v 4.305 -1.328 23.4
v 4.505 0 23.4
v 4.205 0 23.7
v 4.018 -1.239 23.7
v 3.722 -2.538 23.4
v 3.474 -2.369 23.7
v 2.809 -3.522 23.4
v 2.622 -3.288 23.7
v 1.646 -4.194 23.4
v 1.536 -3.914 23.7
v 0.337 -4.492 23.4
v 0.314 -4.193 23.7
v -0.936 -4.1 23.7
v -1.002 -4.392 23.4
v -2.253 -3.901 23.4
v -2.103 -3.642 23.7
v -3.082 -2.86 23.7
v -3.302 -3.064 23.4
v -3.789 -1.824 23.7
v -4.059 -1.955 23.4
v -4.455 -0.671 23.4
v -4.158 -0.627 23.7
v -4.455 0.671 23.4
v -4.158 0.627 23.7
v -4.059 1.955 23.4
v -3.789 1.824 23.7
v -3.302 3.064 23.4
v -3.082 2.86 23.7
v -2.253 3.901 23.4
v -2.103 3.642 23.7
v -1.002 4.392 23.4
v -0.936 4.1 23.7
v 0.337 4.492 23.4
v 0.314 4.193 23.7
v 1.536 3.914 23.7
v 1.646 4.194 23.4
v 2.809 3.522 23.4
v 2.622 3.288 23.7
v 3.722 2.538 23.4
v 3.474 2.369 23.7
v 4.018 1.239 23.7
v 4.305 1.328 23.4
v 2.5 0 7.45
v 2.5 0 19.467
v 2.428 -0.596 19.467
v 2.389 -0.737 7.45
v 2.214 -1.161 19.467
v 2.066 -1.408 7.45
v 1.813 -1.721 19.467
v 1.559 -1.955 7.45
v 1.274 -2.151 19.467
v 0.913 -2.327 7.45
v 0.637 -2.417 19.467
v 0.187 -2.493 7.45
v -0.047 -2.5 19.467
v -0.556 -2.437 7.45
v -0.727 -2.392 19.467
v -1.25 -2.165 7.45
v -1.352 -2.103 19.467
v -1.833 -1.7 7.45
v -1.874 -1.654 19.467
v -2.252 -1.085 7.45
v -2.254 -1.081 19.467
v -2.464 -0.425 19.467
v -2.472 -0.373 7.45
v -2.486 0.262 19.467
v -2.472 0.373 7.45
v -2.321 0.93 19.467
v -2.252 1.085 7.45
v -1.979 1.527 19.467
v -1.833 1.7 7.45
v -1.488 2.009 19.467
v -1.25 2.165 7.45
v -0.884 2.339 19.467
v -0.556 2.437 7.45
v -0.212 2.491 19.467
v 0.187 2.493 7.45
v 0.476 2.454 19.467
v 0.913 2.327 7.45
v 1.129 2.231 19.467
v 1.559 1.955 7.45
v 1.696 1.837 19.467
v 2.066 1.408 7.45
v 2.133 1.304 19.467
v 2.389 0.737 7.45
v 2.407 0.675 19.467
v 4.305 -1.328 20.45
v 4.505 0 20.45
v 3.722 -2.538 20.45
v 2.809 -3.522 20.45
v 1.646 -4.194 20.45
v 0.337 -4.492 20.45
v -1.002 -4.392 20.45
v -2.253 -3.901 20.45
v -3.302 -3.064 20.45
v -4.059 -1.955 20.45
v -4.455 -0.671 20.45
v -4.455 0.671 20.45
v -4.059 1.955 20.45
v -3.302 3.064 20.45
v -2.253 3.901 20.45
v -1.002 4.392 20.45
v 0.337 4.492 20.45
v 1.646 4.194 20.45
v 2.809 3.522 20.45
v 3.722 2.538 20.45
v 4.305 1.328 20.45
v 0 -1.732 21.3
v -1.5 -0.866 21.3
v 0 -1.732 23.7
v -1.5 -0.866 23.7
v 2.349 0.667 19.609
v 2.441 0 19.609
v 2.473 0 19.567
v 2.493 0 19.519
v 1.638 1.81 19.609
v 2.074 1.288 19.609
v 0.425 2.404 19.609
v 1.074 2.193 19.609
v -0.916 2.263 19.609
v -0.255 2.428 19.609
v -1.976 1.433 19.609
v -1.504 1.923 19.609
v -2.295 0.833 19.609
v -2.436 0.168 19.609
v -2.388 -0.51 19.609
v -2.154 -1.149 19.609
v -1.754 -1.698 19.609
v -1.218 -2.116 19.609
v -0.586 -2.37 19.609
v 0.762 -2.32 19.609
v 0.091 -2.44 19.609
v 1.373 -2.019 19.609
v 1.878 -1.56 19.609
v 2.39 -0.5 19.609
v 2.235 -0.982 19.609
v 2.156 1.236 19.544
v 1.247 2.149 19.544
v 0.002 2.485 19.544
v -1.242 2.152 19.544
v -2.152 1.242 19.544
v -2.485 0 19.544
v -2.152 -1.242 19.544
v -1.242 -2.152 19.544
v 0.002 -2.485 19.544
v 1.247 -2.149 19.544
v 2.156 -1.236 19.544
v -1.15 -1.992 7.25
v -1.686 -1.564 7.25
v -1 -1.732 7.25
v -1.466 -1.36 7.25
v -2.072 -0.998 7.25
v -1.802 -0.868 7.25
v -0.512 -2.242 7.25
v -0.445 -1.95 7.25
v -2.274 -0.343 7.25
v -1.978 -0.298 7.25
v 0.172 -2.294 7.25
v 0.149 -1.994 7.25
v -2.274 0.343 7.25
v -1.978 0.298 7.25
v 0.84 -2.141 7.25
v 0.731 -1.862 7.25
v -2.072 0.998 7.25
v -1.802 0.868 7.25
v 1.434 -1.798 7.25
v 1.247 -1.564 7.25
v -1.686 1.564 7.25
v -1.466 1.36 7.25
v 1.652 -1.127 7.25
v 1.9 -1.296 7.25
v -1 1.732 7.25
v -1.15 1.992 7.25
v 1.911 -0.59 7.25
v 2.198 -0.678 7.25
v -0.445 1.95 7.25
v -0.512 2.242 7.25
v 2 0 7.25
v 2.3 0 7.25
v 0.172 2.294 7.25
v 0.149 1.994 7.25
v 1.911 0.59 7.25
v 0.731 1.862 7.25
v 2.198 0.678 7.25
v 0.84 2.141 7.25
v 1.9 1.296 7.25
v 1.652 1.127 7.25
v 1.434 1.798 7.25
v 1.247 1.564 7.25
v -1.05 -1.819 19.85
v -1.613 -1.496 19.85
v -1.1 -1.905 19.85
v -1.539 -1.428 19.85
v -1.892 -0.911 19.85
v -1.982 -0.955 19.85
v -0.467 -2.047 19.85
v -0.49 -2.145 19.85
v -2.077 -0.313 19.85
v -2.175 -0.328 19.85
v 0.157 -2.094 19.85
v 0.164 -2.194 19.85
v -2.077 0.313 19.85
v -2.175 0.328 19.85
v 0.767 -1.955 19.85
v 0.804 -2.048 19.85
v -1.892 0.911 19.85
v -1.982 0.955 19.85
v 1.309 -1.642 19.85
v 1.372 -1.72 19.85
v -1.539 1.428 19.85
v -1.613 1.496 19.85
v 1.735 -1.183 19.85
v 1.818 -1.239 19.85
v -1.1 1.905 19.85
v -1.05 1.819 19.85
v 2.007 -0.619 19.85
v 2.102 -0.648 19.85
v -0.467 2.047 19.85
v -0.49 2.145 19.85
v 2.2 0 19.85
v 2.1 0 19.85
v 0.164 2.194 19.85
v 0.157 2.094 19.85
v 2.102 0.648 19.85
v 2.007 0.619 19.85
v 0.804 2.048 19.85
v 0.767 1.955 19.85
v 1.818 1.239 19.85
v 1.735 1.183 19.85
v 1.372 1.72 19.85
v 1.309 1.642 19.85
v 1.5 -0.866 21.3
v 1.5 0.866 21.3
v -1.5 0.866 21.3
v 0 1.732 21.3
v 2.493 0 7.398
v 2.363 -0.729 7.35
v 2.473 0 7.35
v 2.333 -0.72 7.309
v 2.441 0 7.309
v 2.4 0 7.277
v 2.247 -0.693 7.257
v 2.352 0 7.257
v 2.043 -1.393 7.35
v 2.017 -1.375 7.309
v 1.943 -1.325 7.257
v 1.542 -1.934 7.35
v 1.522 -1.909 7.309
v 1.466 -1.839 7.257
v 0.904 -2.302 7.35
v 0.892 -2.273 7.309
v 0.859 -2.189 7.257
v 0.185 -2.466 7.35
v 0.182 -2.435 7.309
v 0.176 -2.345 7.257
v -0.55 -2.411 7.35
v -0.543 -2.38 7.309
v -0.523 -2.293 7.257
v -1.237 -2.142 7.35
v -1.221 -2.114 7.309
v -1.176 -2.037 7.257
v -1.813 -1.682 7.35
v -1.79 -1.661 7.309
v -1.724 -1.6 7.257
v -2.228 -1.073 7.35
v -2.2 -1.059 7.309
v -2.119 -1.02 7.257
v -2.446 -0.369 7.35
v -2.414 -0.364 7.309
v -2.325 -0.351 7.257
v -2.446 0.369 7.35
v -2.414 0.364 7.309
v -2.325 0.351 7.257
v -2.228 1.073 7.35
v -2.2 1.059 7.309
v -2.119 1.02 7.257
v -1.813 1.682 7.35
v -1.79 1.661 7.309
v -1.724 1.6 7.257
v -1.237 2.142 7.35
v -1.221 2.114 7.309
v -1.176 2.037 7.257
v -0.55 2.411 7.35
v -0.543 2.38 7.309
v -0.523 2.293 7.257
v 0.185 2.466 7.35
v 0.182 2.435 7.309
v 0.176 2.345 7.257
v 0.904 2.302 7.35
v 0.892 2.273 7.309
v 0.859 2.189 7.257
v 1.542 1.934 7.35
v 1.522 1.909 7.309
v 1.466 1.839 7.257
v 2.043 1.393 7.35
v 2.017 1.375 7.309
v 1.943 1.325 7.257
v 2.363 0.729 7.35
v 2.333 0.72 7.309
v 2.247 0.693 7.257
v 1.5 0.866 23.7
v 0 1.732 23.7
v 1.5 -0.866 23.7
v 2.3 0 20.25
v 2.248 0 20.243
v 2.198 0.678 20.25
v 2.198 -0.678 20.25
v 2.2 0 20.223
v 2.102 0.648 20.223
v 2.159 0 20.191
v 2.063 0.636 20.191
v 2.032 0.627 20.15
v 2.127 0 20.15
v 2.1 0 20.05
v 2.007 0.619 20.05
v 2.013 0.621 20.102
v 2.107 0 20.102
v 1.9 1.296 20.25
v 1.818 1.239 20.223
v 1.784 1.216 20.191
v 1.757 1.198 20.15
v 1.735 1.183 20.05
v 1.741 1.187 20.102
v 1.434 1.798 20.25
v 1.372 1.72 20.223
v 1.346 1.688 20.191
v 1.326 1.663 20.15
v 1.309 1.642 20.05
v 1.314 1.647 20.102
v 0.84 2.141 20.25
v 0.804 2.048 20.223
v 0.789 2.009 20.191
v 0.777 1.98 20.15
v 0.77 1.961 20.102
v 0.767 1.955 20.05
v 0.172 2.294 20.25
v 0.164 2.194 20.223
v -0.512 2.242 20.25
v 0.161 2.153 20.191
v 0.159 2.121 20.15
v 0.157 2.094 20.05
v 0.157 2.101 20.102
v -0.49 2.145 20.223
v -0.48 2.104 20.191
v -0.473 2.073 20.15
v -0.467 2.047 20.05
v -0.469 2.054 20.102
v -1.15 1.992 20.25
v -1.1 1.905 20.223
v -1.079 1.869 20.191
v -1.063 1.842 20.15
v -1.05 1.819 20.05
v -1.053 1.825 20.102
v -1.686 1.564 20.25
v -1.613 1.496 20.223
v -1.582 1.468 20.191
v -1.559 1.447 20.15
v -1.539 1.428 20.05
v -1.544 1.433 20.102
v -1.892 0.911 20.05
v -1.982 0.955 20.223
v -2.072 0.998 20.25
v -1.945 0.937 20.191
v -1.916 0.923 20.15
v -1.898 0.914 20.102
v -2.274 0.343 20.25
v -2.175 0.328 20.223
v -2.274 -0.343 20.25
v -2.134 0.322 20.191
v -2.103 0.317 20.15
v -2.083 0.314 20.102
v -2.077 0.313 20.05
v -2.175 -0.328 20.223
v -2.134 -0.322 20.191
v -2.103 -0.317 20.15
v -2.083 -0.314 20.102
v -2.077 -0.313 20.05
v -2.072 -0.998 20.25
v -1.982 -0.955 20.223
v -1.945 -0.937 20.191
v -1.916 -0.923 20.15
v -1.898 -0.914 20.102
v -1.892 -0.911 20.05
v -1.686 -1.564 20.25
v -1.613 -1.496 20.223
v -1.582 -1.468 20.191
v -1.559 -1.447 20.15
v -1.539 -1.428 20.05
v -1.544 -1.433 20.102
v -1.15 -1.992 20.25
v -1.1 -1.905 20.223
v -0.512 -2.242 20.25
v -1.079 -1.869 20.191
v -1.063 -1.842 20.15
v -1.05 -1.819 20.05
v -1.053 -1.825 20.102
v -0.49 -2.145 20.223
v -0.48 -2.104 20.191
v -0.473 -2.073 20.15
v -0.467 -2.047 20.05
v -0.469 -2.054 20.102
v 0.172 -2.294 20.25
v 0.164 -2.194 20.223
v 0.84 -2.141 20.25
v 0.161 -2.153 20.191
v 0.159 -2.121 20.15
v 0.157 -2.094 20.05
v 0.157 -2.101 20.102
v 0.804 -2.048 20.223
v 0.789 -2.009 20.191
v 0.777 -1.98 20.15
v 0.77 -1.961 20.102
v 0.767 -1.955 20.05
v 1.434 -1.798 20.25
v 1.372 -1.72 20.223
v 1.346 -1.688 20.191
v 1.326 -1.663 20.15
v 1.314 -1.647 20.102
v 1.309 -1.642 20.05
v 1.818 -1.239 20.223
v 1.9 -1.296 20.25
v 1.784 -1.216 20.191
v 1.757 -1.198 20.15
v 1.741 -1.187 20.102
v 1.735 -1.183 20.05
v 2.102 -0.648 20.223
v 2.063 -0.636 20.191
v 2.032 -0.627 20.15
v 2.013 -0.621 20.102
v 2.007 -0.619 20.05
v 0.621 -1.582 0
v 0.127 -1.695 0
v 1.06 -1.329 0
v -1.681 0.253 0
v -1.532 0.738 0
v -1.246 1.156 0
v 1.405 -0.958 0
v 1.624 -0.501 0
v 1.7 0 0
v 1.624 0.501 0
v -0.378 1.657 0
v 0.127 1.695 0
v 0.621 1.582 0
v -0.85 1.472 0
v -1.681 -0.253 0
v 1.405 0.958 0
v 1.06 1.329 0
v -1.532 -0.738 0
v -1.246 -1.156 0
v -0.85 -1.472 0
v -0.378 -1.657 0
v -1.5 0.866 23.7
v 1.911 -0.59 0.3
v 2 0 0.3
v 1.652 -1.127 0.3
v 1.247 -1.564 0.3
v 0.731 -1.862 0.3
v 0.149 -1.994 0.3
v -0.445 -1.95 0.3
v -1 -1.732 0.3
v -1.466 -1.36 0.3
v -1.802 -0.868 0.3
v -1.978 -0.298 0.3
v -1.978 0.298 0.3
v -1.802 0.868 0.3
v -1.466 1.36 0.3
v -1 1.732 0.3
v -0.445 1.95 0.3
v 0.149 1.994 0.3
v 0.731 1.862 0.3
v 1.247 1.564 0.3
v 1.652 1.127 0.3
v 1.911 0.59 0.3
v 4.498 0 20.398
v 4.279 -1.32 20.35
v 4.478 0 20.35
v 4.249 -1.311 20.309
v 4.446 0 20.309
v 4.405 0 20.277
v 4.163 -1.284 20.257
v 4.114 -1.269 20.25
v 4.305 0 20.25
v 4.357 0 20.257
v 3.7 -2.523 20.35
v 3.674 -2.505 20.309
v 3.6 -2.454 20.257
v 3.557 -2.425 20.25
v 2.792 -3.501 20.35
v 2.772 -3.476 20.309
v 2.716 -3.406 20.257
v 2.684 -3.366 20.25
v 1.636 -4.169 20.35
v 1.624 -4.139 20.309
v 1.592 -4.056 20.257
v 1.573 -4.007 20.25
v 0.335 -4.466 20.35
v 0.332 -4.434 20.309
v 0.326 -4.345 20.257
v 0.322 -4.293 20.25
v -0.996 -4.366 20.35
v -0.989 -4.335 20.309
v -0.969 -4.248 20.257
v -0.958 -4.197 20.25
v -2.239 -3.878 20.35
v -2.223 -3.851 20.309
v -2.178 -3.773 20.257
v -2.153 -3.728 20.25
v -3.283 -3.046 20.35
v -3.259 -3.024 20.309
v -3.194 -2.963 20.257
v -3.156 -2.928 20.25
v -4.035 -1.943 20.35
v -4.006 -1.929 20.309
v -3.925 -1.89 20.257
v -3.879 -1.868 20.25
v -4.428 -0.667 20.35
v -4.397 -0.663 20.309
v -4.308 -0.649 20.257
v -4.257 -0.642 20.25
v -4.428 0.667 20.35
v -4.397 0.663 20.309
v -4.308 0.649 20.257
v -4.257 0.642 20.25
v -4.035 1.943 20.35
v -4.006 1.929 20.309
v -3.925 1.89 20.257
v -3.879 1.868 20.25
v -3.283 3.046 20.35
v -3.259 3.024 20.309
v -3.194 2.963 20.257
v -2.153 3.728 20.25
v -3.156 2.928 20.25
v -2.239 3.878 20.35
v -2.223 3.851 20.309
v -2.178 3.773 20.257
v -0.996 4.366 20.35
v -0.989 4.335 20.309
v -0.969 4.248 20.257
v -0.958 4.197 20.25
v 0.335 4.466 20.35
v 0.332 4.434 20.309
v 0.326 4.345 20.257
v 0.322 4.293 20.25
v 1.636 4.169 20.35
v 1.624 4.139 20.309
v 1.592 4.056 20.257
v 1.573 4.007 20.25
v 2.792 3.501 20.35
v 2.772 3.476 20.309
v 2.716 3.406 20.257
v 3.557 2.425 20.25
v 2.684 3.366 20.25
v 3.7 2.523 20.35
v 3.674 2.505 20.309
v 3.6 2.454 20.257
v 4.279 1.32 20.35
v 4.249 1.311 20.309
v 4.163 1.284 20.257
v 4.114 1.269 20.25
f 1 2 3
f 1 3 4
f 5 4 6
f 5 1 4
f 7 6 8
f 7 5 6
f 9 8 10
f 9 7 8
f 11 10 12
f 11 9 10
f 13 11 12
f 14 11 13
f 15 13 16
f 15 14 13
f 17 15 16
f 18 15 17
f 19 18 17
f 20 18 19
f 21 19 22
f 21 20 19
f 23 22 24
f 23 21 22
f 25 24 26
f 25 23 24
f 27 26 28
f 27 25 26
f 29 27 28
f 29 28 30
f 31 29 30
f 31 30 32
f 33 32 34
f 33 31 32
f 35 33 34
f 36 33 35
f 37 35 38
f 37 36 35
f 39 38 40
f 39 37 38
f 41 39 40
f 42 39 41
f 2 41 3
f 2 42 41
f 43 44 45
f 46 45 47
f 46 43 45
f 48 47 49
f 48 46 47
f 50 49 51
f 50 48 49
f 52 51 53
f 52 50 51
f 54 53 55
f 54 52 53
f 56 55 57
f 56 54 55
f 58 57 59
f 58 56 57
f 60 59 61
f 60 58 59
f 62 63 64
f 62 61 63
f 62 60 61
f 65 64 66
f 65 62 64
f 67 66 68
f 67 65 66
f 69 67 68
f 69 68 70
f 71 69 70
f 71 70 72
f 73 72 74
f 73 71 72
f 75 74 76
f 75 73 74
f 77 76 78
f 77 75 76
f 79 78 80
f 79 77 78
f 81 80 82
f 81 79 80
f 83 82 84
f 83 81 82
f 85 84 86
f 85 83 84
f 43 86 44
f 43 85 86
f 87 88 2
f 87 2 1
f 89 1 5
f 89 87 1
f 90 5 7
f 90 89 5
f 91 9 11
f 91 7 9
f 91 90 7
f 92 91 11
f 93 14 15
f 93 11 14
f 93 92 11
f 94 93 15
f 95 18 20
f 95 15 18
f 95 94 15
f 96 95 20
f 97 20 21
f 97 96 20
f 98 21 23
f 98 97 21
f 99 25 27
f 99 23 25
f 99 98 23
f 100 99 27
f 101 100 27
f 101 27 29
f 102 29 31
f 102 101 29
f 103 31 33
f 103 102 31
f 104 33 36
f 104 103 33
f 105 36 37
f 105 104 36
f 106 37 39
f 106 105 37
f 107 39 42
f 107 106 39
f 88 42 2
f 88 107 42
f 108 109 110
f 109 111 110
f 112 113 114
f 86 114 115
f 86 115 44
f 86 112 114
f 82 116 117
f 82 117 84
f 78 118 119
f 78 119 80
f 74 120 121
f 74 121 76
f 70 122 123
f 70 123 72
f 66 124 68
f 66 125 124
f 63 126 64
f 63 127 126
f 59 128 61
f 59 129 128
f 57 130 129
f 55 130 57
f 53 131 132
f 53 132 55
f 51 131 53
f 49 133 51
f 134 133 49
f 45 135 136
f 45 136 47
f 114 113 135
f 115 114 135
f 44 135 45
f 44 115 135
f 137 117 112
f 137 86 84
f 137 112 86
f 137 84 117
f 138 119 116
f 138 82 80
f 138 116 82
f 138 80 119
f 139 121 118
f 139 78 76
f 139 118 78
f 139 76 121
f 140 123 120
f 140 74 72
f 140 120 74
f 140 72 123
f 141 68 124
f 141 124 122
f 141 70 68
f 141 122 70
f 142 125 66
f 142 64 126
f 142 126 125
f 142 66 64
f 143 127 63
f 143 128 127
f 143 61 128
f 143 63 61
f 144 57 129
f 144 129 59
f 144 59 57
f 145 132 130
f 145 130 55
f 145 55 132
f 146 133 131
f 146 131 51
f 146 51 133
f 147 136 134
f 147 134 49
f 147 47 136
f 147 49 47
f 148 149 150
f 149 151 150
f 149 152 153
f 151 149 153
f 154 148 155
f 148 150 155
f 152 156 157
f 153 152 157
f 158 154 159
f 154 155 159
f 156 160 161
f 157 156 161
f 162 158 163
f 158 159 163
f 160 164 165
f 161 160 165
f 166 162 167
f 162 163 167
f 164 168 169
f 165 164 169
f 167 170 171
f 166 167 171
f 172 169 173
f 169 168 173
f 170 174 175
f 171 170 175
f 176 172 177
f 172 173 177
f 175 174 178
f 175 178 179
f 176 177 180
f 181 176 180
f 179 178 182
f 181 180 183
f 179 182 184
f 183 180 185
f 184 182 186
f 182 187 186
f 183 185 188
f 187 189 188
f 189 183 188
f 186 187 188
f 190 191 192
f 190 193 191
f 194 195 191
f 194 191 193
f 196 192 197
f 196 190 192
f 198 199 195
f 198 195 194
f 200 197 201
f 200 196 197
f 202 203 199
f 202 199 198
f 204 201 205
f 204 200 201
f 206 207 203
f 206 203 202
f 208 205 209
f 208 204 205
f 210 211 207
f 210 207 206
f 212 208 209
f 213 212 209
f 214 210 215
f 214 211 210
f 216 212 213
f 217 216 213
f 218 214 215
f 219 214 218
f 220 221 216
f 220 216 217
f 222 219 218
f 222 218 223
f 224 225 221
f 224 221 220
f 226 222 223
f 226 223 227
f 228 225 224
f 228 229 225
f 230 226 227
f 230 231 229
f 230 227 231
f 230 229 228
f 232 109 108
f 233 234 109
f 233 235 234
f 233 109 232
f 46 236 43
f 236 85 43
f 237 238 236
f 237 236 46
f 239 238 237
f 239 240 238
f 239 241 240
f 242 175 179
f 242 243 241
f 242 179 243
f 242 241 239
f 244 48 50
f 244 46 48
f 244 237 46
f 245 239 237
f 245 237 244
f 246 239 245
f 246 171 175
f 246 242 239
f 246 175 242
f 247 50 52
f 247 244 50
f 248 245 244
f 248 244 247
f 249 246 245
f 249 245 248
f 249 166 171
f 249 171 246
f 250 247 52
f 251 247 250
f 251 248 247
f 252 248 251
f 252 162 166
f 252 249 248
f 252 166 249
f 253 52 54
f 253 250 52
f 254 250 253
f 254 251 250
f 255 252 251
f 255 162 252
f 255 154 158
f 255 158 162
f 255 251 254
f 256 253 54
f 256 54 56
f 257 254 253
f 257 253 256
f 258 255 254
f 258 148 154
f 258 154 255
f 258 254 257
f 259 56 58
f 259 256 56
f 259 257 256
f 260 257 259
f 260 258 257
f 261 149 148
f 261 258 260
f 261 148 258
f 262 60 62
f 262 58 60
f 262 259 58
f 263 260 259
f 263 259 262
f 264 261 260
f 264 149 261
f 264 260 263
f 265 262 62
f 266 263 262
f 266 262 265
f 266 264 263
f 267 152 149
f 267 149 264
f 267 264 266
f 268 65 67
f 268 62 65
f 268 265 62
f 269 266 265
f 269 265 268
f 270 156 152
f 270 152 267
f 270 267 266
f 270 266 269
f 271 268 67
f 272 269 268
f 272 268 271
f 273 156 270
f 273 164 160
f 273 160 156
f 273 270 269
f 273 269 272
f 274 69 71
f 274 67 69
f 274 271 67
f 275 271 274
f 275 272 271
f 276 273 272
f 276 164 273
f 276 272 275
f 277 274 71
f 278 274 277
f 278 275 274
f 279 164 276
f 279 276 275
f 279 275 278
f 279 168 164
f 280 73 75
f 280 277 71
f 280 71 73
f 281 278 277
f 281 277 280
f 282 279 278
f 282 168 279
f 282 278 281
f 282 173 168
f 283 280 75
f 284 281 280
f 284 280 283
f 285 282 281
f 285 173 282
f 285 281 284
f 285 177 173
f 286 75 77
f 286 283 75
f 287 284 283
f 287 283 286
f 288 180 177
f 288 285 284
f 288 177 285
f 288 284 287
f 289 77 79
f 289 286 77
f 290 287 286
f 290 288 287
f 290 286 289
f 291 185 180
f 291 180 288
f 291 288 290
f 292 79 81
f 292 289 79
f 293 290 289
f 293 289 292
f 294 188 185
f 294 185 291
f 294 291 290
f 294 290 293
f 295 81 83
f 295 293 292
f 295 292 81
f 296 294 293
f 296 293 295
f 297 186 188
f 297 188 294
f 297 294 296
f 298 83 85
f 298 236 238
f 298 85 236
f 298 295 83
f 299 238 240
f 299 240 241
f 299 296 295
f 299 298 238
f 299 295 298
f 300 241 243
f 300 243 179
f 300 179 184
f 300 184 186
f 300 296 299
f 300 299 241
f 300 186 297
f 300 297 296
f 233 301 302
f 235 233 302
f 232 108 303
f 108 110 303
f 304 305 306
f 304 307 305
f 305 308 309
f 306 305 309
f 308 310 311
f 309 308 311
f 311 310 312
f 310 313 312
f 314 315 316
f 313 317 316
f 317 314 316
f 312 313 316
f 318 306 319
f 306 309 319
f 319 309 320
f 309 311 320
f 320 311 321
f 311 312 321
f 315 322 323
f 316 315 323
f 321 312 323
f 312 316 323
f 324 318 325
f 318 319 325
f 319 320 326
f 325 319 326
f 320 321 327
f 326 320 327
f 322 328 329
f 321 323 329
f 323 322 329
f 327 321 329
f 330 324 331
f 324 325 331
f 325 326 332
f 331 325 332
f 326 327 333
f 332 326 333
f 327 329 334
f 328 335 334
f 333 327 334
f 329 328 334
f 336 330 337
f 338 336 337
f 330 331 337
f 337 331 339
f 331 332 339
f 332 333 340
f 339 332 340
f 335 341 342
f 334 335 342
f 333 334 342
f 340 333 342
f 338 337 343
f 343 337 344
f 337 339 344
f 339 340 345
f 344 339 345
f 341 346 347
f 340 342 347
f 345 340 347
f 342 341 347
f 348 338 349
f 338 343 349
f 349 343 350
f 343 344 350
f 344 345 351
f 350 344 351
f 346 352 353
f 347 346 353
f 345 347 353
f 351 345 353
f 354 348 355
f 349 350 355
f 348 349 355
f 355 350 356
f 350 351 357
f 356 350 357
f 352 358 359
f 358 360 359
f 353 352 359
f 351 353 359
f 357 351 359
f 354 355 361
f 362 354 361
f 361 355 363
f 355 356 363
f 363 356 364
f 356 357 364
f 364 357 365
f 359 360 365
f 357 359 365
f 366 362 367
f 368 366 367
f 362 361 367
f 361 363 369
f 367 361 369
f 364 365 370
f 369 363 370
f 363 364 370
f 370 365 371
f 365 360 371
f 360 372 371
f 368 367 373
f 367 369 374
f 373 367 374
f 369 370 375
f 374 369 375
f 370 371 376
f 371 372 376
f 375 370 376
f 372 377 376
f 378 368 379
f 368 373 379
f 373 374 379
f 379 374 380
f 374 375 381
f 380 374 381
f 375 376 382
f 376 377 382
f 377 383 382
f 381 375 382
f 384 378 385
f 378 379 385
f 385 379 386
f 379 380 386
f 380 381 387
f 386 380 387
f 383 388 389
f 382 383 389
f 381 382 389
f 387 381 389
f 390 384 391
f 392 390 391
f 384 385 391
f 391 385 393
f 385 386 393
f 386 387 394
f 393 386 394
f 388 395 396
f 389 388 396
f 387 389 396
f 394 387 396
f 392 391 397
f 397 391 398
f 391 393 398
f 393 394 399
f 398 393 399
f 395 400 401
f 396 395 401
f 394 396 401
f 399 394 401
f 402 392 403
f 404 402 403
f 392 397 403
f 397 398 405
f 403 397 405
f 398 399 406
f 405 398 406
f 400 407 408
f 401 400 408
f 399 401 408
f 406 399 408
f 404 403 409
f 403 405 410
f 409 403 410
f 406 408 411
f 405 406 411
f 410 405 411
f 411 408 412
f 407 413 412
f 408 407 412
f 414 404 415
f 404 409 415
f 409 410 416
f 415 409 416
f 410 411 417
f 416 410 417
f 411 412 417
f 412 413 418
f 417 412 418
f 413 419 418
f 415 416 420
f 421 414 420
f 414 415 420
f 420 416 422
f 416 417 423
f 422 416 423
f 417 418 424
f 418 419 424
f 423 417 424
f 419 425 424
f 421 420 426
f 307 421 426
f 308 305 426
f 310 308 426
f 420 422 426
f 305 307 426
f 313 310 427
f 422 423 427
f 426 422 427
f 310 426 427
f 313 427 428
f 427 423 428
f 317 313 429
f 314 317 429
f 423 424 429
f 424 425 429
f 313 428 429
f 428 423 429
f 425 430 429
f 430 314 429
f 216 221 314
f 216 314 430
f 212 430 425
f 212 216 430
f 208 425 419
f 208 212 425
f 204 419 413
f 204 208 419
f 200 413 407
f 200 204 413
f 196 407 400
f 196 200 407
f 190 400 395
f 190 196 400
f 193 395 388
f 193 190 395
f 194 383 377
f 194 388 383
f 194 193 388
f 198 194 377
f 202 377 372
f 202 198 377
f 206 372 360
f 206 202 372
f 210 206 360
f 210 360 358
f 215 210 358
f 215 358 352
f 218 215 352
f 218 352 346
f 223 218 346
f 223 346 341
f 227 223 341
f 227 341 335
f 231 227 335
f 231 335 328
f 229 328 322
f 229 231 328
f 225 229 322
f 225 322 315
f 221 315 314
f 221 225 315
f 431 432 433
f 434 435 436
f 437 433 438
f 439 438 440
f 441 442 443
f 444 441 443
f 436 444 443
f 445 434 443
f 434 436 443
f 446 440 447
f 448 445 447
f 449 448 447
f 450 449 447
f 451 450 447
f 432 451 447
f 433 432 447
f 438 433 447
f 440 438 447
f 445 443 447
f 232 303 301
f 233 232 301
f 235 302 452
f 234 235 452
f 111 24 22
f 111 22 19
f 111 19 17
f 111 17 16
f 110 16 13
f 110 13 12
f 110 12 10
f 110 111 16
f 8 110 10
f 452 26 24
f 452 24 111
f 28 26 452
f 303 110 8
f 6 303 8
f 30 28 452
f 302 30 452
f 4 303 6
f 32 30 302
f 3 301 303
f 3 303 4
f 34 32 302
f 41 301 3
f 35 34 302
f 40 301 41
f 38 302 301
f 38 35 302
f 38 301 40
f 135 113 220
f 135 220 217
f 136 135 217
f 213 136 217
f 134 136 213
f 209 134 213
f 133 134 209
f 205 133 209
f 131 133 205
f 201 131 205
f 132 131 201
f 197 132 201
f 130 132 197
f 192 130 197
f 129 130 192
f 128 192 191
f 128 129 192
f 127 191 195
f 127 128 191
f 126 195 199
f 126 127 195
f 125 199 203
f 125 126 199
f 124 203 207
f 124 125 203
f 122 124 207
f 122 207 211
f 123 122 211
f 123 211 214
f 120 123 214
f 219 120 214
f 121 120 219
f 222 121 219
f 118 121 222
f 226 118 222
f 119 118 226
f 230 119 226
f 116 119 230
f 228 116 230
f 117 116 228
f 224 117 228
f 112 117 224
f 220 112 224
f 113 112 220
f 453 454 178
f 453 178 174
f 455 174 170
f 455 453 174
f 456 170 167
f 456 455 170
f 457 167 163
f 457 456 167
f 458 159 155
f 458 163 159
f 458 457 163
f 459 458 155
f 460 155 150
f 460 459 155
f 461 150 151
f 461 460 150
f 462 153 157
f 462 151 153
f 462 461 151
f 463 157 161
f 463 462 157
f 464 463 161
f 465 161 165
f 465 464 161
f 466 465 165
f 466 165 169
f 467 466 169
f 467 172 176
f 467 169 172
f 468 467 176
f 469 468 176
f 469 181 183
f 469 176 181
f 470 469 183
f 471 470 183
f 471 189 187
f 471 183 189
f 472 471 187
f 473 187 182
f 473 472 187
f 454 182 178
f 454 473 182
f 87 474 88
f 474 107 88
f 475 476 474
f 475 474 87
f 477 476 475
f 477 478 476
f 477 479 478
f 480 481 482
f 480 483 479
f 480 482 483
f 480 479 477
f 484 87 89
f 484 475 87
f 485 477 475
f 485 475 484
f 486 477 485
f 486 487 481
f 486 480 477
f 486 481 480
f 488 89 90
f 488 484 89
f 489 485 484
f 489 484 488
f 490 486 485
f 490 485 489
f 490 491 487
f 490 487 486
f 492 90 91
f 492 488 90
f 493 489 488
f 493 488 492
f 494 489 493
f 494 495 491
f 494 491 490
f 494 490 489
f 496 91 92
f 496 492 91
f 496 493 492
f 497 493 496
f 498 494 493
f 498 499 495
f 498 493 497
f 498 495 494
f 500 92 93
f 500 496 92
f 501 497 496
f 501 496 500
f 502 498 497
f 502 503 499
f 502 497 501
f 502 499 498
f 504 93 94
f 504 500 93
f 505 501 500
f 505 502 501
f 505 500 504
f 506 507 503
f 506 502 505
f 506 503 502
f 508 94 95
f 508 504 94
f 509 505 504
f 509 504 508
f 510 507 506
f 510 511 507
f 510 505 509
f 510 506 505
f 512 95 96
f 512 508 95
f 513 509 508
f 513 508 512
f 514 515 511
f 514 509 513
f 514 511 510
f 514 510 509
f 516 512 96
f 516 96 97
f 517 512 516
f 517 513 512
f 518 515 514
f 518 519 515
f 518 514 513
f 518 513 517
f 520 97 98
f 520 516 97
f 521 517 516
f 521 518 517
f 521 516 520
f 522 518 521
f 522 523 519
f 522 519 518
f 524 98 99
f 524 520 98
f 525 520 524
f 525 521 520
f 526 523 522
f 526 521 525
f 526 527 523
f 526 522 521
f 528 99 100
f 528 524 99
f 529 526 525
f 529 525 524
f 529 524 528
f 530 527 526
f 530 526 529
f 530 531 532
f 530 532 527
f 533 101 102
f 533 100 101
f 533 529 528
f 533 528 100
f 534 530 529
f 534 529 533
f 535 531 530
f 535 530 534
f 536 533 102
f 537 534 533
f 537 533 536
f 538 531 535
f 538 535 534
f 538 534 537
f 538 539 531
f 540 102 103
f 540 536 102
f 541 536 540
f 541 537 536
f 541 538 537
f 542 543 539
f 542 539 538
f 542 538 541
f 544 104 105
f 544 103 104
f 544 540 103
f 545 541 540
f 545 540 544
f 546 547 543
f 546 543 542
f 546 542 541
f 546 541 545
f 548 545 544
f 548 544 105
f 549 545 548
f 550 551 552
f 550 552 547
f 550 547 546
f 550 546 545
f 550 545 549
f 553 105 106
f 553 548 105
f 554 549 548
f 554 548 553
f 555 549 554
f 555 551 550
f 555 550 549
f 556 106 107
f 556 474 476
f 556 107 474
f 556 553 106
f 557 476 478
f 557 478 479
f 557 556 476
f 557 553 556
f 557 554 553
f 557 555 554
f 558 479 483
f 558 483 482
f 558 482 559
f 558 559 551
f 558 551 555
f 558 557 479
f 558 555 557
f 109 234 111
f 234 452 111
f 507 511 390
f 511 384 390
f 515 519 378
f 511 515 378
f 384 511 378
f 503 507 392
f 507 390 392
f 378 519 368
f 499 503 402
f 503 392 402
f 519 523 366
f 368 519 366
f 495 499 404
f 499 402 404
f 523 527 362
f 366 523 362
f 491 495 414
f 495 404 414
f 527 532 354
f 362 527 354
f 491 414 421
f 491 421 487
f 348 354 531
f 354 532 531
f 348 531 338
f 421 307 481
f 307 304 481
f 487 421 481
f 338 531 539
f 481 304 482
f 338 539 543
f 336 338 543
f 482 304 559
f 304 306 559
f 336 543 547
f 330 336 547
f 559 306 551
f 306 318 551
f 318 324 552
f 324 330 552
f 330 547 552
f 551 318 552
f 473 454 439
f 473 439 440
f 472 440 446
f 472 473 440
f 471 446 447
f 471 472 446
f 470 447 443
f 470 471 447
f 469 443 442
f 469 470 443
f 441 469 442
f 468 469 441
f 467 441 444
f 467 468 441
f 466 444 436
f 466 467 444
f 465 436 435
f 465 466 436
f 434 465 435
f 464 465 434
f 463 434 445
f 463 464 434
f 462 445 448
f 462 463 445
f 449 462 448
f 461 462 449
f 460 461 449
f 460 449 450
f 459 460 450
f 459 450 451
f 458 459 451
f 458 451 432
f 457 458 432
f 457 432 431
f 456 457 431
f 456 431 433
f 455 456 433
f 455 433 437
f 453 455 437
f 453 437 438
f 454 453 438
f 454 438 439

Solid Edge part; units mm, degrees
sketch "Sketch1" plane through (0, 0, 0) normal (0, -1, 0) x (1, 0, 0)
  line L0 (0, 23.7) -> (4.505, 23.7)
  line L1 (4.505, 23.7) -> (4.505, 20.25)
  line L2 (4.505, 20.25) -> (2.1, 20.25)
  line L3 (2.1, 20.25) -> (2.1, 19.85)
  line L4 (2.1, 19.85) -> (2.5, 19.85)
  line L5 (2.5, 19.85) -> (2.5, 7.25)
  line L6 (2.5, 7.25) -> (2, 7.25)
  line L7 (2, 7.25) -> (2, 0)
  line L8 (2, 0) -> (0, 0)
  dimension "D1" = 4.505
  dimension "D2" = 3.45
  dimension "D3" = 13
  dimension "D4" = 0.4
  dimension "D5" = 7.25
  dimension "D6" = 2.5
  dimension "D7" = 2
revolve "RevolvedProtrusion1" add sketch "Sketch1" angle 360 about axis through (0, 0, 0) along (0, 0, 1)
chamfer "Chamfer1" distance 0.3 angle 45 3 edges at (-2.5, 0, 19.85) (-4.505, 0, 23.7) (-2, 0, 0)
fillet "Round_1" radius 0.2 4 edges at (-4.505, 0, 20.25) (-2.1, 0, 20.25) (-2.5, 0, 7.25) (-2.5, 0, 19.55)
sketch "Sketch2" plane through (0, 0, 23.7) normal (0, 0, 1) x (1, 0, 0)
  line L0 (1.5, 0.866) -> (0, 1.7321)
  line L1 (0, 1.7321) -> (-1.5, 0.866)
  line L2 (-1.5, 0.866) -> (-1.5, -0.866)
  line L3 (-1.5, -0.866) -> (0, -1.7321)
  line L4 (0, -1.7321) -> (1.5, -0.866)
  line L5 (1.5, -0.866) -> (1.5, 0.866)
  dimension "D1" = 3
extrude "ExtrudedCutout_1" cut sketch "Sketch2" against normal blind 2.4
properties material "Stainless Steel, 304"
